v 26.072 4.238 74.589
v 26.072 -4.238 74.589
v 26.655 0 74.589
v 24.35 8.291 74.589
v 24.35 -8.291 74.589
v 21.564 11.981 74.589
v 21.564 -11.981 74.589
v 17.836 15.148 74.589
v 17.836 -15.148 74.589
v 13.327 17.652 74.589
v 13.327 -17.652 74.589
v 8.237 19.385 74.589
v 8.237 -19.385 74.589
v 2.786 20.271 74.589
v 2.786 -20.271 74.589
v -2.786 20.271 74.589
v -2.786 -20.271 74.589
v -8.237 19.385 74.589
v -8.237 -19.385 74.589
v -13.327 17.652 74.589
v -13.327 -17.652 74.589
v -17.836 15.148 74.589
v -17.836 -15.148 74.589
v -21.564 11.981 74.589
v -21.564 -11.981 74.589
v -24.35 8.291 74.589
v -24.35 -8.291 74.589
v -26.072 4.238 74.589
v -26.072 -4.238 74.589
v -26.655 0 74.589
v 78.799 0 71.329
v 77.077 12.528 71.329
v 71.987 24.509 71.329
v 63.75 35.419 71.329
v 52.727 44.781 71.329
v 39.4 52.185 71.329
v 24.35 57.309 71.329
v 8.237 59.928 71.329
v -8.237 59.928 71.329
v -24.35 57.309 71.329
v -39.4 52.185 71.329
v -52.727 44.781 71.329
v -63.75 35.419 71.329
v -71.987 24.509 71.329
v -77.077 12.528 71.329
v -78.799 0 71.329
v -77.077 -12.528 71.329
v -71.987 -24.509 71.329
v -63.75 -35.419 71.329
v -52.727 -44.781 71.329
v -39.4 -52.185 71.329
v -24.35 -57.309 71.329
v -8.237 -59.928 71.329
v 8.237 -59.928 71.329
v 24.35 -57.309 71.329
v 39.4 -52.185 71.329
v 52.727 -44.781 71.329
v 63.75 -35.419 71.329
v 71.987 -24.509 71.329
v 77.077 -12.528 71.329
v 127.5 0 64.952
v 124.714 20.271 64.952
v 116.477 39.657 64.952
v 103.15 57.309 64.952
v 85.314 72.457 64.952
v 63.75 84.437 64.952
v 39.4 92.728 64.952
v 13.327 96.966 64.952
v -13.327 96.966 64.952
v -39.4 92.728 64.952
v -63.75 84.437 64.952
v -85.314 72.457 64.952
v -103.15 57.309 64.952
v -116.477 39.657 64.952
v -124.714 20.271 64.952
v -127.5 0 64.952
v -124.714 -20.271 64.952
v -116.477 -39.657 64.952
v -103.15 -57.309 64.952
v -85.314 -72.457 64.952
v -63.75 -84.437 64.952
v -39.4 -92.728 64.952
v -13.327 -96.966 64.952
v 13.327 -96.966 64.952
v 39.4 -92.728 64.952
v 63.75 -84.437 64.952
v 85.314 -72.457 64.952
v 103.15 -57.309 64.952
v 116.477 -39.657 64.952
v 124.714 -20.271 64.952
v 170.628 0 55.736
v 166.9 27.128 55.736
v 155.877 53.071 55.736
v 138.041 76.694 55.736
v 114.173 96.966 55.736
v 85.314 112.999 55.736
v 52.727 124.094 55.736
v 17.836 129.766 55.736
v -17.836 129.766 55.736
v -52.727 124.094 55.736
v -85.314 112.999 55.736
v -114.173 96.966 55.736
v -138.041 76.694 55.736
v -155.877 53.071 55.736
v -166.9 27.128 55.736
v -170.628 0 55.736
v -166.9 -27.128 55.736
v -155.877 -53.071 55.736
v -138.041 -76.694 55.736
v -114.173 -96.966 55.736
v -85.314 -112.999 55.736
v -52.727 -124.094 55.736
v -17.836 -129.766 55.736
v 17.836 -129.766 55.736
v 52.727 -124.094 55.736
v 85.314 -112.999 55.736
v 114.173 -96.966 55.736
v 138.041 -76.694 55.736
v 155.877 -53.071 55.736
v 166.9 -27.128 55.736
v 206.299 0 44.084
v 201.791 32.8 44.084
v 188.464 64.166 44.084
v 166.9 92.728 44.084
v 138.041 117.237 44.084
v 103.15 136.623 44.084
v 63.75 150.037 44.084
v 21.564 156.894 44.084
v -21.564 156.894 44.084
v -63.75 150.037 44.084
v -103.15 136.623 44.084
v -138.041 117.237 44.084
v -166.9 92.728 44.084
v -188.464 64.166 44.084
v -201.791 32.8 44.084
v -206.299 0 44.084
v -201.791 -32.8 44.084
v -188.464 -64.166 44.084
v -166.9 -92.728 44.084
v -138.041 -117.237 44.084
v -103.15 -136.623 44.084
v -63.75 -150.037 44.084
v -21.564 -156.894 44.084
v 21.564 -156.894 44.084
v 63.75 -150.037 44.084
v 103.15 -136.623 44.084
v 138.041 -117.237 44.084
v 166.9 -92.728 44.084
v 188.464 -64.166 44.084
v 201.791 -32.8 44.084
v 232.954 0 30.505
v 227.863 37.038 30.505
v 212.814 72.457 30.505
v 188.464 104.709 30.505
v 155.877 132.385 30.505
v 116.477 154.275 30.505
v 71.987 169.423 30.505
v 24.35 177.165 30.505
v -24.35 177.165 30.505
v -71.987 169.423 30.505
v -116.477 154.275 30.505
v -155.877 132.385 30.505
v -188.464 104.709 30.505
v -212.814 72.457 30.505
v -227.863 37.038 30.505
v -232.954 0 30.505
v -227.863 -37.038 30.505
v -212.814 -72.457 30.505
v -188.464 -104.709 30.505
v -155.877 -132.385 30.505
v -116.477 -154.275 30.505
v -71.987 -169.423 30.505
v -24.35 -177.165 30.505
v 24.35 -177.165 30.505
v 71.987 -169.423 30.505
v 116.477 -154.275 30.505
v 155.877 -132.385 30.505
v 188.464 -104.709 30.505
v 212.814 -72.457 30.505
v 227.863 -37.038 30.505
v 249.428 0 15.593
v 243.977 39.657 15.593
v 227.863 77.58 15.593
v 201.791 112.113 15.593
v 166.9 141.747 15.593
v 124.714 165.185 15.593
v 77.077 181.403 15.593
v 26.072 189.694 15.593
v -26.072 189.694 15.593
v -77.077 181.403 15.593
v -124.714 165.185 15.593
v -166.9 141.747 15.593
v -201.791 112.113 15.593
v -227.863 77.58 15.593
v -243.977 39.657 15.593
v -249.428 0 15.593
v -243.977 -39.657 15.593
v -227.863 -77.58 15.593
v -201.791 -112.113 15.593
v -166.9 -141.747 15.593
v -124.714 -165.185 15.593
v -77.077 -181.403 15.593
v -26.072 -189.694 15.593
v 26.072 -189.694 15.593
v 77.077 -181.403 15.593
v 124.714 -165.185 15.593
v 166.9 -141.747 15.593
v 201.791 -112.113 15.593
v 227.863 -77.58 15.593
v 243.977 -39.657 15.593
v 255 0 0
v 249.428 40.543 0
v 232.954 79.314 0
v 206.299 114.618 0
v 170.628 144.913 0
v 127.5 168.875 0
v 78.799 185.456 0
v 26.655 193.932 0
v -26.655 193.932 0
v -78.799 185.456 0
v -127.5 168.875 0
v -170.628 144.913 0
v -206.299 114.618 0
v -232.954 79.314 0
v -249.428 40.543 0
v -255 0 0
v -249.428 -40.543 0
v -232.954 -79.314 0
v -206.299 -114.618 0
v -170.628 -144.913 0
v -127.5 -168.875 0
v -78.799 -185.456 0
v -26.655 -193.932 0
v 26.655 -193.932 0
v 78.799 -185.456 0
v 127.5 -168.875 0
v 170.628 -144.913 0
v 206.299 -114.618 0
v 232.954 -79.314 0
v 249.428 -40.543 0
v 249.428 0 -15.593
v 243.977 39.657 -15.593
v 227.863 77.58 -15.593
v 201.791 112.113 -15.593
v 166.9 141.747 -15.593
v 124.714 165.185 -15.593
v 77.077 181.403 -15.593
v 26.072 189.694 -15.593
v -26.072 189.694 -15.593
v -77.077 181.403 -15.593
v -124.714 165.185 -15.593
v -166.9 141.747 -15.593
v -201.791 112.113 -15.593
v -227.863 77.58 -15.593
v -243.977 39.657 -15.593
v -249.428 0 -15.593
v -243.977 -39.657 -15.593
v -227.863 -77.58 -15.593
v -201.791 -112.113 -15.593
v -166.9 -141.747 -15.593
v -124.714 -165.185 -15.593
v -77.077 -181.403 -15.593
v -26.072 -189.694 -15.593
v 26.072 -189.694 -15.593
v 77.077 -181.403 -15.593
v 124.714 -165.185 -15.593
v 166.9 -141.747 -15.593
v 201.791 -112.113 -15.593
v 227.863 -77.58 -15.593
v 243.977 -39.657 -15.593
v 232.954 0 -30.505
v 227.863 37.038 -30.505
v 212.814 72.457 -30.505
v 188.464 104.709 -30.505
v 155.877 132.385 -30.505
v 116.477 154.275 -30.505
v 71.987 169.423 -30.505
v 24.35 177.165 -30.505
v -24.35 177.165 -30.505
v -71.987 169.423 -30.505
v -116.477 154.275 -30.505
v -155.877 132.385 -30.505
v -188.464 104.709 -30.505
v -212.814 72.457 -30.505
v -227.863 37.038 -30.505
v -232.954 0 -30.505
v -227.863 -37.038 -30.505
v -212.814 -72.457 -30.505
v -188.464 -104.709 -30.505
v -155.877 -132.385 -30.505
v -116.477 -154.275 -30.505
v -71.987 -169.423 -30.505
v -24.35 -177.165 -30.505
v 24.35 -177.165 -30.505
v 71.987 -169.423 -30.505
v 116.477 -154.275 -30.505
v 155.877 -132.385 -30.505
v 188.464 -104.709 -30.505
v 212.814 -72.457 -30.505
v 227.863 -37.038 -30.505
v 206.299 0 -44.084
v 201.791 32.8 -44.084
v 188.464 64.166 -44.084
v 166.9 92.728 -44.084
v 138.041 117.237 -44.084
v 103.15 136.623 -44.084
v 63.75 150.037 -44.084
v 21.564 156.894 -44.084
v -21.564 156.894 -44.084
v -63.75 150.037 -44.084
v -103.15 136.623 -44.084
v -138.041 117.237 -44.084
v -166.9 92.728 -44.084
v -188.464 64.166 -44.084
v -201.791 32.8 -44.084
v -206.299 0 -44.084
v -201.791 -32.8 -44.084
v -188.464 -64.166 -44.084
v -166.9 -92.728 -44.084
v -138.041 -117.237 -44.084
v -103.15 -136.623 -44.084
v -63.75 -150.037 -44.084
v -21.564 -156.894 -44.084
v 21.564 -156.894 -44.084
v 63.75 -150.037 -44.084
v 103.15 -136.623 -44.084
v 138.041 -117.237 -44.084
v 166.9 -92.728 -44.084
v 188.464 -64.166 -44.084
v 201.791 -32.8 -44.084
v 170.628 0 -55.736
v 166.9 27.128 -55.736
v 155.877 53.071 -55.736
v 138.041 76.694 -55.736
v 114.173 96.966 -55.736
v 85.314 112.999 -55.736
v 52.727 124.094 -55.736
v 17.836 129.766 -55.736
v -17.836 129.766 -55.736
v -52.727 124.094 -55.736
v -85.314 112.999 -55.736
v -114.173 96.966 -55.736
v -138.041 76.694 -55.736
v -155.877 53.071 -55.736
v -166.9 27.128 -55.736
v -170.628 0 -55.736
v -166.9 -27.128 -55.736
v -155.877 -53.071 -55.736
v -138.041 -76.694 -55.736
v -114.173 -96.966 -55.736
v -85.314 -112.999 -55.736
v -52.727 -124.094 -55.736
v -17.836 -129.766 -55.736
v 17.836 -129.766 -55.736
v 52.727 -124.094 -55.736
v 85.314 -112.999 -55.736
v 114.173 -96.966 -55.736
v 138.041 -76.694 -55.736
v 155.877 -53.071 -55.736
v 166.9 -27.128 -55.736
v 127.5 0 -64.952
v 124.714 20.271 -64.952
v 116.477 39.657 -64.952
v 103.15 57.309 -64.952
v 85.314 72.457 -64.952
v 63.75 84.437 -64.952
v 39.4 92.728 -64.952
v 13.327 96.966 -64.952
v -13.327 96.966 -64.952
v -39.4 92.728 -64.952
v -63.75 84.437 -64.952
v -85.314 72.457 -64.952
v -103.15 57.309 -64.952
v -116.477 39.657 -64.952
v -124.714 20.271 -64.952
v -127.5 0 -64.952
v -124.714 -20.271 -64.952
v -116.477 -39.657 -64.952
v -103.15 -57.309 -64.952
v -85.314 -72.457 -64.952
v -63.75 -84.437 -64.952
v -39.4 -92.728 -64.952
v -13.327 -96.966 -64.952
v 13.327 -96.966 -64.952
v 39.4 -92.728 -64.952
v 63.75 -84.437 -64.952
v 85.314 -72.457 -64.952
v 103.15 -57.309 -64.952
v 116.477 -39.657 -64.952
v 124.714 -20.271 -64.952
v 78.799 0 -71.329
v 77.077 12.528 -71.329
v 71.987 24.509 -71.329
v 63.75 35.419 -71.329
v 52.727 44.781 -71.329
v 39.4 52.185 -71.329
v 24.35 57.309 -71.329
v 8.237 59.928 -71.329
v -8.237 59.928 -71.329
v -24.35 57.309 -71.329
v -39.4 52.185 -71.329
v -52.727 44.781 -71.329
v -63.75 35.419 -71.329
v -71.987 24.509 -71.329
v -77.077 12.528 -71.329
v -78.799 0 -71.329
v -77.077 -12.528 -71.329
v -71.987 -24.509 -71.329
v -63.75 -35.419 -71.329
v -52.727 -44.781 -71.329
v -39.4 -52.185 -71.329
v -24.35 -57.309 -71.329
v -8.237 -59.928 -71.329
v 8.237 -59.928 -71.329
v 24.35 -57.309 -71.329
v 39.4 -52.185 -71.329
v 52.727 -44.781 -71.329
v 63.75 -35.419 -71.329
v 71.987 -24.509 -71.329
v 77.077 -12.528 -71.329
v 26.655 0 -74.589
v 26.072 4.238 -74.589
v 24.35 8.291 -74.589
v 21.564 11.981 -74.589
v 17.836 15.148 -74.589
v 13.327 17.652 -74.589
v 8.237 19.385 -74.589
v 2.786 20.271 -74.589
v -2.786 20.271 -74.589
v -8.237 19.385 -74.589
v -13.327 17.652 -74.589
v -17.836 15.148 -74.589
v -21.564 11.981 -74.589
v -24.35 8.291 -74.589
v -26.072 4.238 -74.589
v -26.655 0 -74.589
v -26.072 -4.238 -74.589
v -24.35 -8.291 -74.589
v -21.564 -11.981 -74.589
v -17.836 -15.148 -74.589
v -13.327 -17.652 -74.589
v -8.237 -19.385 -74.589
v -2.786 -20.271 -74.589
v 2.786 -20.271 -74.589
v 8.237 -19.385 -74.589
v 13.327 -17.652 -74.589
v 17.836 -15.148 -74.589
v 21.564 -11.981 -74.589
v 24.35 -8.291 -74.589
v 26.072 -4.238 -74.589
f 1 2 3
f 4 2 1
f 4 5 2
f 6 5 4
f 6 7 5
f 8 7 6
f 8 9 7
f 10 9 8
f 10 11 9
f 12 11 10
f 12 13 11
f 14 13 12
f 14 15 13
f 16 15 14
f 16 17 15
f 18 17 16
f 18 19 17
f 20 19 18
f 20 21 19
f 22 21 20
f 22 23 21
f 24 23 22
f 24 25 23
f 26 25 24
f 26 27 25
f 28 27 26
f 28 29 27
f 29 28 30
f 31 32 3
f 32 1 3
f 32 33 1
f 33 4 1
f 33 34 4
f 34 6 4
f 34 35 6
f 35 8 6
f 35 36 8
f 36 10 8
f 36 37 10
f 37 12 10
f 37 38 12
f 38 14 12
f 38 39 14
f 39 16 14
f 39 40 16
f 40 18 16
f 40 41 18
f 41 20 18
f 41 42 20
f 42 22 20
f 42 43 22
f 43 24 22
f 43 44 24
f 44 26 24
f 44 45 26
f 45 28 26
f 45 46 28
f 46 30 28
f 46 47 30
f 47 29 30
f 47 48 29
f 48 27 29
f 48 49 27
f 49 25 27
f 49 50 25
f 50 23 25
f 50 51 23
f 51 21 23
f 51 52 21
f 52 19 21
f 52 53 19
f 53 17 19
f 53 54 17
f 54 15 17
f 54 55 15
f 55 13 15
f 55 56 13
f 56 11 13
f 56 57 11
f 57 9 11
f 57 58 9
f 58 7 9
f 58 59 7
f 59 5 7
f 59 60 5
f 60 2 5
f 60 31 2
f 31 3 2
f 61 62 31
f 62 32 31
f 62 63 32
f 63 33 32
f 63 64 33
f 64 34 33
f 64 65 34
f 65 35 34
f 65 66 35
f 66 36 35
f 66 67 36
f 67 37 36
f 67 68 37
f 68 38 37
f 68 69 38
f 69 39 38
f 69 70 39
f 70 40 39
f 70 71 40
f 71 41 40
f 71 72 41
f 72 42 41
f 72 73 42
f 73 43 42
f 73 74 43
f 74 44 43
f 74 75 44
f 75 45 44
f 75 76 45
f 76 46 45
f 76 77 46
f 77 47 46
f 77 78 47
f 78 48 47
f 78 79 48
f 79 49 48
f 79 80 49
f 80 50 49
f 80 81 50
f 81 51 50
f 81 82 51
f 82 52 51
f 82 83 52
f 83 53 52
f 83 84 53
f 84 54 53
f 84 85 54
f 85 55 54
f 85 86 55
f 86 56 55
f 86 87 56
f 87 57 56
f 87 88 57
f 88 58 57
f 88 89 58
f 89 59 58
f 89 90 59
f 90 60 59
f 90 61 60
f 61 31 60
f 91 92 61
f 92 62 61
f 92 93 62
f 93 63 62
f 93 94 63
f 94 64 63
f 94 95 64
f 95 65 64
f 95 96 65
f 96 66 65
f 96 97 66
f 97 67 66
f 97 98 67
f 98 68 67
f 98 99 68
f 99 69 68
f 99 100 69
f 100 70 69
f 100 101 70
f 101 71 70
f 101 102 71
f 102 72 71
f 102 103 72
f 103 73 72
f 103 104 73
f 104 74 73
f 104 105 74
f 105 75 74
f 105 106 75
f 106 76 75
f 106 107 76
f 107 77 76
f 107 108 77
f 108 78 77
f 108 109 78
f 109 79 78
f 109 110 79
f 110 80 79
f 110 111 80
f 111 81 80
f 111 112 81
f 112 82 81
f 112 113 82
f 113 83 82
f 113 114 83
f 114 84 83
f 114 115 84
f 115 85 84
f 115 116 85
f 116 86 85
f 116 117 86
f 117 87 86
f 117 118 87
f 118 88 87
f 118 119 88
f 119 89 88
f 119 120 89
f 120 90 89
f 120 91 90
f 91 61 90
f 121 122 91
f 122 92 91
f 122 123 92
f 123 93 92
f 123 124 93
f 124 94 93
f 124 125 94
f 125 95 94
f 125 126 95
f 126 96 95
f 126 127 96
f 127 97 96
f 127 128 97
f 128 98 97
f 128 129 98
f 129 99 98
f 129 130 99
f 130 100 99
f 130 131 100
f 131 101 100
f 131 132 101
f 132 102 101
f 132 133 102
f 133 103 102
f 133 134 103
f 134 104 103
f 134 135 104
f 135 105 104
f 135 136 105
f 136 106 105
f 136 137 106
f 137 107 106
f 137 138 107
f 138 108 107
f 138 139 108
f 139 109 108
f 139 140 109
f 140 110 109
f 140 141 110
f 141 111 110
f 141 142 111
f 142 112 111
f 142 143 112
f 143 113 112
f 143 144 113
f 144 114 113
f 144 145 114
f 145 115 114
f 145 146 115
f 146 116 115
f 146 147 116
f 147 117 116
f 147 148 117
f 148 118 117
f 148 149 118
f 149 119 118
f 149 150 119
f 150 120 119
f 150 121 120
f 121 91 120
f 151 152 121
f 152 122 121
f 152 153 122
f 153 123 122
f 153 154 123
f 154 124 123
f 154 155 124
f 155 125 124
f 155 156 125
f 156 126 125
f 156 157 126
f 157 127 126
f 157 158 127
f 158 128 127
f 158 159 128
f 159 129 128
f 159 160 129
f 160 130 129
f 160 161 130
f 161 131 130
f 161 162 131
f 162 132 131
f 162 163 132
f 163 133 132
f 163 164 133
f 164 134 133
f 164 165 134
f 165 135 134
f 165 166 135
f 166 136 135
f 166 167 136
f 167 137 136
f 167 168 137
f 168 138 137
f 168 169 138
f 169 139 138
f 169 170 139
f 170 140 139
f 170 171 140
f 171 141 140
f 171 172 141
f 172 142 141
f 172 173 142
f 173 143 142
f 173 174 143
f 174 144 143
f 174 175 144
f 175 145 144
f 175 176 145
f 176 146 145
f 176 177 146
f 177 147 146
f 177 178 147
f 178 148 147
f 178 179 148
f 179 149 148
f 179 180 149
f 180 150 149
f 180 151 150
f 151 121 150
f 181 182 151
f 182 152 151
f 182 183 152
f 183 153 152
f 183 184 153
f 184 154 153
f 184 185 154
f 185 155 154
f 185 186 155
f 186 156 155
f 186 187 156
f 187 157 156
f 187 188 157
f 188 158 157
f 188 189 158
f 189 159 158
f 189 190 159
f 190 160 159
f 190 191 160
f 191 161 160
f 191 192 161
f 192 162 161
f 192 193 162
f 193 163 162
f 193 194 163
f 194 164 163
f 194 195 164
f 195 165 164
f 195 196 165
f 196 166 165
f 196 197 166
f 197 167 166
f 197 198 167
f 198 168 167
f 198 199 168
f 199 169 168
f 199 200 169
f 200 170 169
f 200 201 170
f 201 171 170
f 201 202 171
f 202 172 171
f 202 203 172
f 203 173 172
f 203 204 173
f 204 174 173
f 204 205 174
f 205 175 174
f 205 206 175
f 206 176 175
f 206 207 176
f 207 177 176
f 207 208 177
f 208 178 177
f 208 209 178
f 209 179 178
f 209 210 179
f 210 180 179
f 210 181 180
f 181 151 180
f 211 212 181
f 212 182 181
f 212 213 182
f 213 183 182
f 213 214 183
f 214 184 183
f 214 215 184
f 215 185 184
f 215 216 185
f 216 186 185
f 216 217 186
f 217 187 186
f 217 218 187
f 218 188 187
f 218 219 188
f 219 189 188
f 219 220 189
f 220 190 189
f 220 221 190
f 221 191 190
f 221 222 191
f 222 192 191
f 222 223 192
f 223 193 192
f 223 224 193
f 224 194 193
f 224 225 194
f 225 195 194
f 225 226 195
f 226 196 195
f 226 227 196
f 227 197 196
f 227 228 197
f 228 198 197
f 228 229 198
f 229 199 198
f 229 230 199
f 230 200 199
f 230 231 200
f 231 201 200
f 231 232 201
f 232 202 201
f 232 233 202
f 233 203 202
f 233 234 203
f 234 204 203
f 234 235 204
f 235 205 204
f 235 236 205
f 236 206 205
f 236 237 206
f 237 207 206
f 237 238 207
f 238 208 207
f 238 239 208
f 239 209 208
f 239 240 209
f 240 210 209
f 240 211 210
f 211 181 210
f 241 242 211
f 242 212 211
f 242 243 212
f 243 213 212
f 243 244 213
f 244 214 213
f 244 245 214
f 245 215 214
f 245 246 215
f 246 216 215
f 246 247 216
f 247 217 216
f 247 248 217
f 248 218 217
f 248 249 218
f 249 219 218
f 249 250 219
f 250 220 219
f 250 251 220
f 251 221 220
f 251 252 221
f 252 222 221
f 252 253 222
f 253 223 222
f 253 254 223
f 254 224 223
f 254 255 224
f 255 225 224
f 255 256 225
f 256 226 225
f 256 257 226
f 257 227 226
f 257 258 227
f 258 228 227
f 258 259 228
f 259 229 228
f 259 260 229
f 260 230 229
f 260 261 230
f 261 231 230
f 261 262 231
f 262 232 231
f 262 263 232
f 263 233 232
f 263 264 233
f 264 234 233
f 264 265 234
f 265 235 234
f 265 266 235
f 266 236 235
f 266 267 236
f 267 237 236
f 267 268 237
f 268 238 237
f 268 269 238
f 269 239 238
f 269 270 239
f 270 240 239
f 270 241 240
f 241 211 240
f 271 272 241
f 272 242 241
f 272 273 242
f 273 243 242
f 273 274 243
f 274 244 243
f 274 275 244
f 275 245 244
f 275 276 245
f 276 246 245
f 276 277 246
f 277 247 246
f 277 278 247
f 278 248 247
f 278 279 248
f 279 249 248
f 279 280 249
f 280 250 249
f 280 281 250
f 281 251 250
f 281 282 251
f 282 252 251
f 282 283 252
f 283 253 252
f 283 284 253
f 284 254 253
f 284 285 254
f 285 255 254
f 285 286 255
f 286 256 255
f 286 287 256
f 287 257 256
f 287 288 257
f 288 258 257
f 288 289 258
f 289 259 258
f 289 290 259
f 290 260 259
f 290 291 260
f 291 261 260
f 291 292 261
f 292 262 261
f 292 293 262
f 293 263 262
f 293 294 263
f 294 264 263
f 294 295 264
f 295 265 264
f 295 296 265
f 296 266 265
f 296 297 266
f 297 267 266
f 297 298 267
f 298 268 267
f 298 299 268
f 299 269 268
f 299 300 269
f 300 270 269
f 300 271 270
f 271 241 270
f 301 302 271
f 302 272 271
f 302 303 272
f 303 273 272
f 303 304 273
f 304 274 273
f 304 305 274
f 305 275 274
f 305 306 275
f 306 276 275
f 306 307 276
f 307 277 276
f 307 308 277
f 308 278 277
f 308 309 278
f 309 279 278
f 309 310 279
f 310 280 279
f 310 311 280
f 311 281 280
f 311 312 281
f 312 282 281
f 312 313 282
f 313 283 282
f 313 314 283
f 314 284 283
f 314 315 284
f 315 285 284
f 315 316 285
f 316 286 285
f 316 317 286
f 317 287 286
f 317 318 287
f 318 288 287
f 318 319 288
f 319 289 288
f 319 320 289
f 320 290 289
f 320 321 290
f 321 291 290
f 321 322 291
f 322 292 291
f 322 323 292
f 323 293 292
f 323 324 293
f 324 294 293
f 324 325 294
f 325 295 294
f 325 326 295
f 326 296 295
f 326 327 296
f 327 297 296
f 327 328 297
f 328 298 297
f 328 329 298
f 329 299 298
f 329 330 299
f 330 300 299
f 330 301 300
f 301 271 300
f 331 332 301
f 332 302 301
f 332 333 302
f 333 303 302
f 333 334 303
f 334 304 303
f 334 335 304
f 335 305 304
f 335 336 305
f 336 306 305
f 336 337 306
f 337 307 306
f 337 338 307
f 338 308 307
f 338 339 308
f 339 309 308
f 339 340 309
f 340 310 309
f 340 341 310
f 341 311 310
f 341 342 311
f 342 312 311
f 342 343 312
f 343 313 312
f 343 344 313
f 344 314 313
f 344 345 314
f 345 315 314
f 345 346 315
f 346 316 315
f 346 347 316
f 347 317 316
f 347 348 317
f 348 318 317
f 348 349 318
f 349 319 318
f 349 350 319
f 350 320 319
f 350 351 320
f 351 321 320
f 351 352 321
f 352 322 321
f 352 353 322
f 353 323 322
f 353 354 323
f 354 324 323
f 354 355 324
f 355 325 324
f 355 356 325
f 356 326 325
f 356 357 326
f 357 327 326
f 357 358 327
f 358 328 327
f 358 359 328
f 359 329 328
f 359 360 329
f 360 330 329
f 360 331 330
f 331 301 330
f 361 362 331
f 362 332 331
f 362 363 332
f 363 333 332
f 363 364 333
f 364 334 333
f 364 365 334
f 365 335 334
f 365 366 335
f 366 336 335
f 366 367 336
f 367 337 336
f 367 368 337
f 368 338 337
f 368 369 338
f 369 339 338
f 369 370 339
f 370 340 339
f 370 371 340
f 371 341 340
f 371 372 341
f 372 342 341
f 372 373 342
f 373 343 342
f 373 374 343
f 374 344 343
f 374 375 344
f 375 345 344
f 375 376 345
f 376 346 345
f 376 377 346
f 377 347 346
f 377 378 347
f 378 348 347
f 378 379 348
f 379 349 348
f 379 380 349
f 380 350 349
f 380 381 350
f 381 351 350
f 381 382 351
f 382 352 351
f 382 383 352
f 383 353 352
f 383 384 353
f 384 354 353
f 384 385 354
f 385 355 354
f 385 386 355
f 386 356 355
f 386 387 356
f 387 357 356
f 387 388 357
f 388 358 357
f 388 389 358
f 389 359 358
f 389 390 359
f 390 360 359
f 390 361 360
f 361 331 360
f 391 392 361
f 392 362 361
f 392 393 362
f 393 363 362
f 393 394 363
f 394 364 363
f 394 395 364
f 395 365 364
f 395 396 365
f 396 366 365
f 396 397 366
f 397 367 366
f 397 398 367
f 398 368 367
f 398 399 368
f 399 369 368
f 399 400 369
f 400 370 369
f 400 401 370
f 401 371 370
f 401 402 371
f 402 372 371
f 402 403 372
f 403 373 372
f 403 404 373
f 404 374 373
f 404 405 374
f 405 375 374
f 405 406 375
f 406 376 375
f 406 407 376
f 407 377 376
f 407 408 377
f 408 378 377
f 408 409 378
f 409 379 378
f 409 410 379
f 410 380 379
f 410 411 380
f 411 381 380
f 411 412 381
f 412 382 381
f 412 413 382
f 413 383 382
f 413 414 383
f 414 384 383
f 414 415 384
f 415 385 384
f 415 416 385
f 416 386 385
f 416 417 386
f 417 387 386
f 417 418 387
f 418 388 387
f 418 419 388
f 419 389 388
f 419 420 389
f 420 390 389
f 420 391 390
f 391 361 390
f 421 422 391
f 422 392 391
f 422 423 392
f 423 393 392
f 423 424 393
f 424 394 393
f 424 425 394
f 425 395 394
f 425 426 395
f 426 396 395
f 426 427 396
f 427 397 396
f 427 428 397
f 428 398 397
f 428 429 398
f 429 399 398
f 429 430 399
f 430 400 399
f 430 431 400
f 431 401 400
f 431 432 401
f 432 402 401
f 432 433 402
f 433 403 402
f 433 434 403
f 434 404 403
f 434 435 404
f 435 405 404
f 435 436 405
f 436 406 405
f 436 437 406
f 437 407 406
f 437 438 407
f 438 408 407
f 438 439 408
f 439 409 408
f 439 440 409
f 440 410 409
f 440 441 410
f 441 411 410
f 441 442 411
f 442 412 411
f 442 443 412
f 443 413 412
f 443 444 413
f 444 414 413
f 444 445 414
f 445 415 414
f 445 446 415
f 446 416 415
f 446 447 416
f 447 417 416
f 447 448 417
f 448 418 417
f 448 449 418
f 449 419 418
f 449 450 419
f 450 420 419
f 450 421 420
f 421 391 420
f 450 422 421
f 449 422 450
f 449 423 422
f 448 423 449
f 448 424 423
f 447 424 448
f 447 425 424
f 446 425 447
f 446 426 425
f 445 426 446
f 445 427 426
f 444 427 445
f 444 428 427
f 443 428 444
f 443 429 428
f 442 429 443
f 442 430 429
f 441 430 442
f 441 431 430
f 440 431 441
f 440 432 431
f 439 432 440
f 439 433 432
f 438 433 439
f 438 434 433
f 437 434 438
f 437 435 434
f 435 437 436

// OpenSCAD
// Generated by SolidPython 1.0.1 on 2020-07-29 00:46:53


scale(v = [17, 13, 5]) {
	sphere(r = 15);
}
/***********************************************
*********      SolidPython code:      **********
************************************************
 
# import packages: SolidPython
from solid import *
from solid.utils import *
from itertools import chain, combinations, permutations


class Resize:

    def __init__(self, scad_file):
        self.scad_file = scad_file
        #self.scad_file = import_scad(scad_file)
        # cone/cylinder param:
        self.r1 = 0
        self.r2 = 0
        self.h = 0
        # rectangular prism param:
        self.w = 0
        self.l = 0
        # ellipse param:
        self.r = 0

    # import OpenScad code (file name corresponds to shape)


    # classify shape + parameters
    def assign(self, param1, param2, param3):
        if self.scad_file == 'cone.scad':
            self.r1 = param1
            self.r2 = param2
            self.h = param3
        elif self.scad_file == 'cylinder.scad':
            self.r1 = param1
            self.r2 = param2
            self.h = param3
        elif self.scad_file == 'rectangularPrism.scad':
            self.h = param1
            self.l = param2
            self.w = param3
        else:
            self.r = param1
            self.h = param2

    # resize parameters
    def iterate(self):
        x = range(3, 20, 2)
        i = 1
        if self.scad_file == 'cone.scad':
            tempList = list(permutations(x, 2))
            for temp in tempList:
                param1 = temp[0]
                param2 = temp[1]
                filepath = 'produced_scad_files/' + 'cone' + str(param1) + '_' + str(param2) + '_' + '.scad'
                scad_render_to_file(cylinder(h=param1, r1=param2, r2=0), filepath)

        elif self.scad_file == 'cylinder.scad':
            tempList = list(permutations(x, 3))
            for temp in tempList:
                param1 = temp[0]
                param2 = temp[1]
                filepath = 'produced_scad_files/' + 'cylinder' + str(param1) + '_' + str(param2) + '_' + '.scad'
                scad_render_to_file(cylinder(h=param1, r1=param2, r2=param2), filepath)

        elif self.scad_file == 'rectangularPrism.scad':
            tempList = list(permutations(x, 3))
            for temp in tempList:
                param1 = temp[0]
                param2 = temp[1]
                param3 = temp[2]
                filepath = 'produced_scad_files/' + 'rectangularPrism' + str(param1) + '_' + str(param2) + '_' + str(
                    param3) + '.scad'
                scad_render_to_file(cube(size=(param1, param2, param3)), filepath)

        elif self.scad_file == 'ellipse.scad':
            tempList = list(permutations(x, 4))
            for temp in tempList:
                param1 = temp[0]
                param2 = temp[1]
                param3 = temp[2]
                param4 = temp[3]
                filepath = 'produced_scad_files/' + 'ellipse' + str(param1) + '_' + str(param2) + '_' + str(param3) + '_' + str(param4) + '.scad'
                scad_render_to_file(scale([param1, param2, param3])(sphere(r=param4)), filepath)

    def render_to_scadfile(self):
        scad_render_to_file(scad, 'example.scad') 
 
************************************************/
